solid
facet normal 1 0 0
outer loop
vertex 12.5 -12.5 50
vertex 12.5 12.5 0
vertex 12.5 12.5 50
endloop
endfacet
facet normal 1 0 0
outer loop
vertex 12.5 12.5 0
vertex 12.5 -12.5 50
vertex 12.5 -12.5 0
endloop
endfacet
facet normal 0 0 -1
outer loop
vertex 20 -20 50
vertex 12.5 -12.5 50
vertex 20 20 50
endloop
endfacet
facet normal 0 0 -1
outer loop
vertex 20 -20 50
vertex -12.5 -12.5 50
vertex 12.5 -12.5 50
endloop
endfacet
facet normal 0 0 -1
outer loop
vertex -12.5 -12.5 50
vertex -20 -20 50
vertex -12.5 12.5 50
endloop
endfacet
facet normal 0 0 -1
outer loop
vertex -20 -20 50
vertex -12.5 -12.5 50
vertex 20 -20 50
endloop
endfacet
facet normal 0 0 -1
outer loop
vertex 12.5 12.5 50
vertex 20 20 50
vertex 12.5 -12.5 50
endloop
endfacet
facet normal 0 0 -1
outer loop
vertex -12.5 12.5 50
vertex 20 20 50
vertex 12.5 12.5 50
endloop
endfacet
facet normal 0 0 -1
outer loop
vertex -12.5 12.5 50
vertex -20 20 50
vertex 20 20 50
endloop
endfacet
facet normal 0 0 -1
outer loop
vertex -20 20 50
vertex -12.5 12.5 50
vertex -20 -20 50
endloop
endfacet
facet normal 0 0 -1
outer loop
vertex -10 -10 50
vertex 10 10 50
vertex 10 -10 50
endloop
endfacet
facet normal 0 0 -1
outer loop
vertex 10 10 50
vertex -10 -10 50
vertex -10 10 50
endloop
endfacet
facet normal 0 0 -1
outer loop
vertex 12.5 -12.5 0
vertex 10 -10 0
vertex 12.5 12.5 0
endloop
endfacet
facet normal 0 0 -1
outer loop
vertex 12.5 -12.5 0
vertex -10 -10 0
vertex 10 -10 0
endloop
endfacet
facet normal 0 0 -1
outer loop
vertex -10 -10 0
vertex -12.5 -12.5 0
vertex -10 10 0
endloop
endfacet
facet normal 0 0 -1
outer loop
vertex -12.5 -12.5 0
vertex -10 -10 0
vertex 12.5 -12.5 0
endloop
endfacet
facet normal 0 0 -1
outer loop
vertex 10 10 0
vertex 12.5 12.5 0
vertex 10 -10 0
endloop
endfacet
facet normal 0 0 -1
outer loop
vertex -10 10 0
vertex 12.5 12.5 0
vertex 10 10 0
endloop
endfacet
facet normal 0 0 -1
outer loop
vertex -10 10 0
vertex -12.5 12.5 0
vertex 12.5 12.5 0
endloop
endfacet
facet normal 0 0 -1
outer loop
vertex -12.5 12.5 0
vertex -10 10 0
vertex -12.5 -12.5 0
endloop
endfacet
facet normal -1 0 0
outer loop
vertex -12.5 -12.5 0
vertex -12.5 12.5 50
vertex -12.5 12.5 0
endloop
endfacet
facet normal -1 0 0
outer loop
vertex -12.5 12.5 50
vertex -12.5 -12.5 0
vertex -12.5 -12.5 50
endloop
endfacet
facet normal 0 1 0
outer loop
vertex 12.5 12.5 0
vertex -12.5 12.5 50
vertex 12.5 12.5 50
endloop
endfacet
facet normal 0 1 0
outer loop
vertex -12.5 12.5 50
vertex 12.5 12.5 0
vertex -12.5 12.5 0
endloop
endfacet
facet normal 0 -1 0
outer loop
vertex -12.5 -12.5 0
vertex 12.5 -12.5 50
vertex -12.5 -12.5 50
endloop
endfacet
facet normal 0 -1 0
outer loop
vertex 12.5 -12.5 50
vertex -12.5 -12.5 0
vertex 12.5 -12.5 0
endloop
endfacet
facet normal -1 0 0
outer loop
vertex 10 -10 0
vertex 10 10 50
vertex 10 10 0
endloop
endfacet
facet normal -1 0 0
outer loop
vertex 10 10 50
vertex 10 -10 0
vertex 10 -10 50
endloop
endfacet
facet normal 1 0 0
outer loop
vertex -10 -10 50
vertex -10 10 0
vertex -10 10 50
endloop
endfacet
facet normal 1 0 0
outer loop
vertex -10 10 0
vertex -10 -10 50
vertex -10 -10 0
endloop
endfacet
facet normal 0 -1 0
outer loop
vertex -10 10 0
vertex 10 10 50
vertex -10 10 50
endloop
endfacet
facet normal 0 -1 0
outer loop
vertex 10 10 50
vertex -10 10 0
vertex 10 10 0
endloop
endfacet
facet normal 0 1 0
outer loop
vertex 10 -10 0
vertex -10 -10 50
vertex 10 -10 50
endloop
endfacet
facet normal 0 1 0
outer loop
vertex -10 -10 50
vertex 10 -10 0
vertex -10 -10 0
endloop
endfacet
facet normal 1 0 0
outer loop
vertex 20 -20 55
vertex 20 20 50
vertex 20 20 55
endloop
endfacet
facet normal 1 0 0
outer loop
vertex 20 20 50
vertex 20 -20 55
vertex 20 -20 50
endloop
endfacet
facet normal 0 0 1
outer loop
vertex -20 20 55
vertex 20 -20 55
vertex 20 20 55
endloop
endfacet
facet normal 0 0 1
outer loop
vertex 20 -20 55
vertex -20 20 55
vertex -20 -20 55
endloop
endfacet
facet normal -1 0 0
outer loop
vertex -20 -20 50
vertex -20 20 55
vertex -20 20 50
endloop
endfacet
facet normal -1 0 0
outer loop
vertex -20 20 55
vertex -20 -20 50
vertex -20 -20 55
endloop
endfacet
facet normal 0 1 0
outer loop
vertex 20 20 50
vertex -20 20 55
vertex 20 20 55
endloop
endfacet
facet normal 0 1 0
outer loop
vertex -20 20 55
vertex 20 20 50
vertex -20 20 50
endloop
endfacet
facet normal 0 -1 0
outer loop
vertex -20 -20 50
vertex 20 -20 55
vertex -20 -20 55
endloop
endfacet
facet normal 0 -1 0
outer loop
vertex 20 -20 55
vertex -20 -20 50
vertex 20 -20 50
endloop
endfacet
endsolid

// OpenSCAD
module profileConnector(){
    difference() {
        translate([0,0,25]) cube([25,25,50], center = true);
        translate([0,0,25]) cube([20,20,50], center = true);
    }
}

module connectorconnector() {
    translate([0,0,52.5]) cube([40,40,5], center = true);
}

profileConnector();
connectorconnector();
